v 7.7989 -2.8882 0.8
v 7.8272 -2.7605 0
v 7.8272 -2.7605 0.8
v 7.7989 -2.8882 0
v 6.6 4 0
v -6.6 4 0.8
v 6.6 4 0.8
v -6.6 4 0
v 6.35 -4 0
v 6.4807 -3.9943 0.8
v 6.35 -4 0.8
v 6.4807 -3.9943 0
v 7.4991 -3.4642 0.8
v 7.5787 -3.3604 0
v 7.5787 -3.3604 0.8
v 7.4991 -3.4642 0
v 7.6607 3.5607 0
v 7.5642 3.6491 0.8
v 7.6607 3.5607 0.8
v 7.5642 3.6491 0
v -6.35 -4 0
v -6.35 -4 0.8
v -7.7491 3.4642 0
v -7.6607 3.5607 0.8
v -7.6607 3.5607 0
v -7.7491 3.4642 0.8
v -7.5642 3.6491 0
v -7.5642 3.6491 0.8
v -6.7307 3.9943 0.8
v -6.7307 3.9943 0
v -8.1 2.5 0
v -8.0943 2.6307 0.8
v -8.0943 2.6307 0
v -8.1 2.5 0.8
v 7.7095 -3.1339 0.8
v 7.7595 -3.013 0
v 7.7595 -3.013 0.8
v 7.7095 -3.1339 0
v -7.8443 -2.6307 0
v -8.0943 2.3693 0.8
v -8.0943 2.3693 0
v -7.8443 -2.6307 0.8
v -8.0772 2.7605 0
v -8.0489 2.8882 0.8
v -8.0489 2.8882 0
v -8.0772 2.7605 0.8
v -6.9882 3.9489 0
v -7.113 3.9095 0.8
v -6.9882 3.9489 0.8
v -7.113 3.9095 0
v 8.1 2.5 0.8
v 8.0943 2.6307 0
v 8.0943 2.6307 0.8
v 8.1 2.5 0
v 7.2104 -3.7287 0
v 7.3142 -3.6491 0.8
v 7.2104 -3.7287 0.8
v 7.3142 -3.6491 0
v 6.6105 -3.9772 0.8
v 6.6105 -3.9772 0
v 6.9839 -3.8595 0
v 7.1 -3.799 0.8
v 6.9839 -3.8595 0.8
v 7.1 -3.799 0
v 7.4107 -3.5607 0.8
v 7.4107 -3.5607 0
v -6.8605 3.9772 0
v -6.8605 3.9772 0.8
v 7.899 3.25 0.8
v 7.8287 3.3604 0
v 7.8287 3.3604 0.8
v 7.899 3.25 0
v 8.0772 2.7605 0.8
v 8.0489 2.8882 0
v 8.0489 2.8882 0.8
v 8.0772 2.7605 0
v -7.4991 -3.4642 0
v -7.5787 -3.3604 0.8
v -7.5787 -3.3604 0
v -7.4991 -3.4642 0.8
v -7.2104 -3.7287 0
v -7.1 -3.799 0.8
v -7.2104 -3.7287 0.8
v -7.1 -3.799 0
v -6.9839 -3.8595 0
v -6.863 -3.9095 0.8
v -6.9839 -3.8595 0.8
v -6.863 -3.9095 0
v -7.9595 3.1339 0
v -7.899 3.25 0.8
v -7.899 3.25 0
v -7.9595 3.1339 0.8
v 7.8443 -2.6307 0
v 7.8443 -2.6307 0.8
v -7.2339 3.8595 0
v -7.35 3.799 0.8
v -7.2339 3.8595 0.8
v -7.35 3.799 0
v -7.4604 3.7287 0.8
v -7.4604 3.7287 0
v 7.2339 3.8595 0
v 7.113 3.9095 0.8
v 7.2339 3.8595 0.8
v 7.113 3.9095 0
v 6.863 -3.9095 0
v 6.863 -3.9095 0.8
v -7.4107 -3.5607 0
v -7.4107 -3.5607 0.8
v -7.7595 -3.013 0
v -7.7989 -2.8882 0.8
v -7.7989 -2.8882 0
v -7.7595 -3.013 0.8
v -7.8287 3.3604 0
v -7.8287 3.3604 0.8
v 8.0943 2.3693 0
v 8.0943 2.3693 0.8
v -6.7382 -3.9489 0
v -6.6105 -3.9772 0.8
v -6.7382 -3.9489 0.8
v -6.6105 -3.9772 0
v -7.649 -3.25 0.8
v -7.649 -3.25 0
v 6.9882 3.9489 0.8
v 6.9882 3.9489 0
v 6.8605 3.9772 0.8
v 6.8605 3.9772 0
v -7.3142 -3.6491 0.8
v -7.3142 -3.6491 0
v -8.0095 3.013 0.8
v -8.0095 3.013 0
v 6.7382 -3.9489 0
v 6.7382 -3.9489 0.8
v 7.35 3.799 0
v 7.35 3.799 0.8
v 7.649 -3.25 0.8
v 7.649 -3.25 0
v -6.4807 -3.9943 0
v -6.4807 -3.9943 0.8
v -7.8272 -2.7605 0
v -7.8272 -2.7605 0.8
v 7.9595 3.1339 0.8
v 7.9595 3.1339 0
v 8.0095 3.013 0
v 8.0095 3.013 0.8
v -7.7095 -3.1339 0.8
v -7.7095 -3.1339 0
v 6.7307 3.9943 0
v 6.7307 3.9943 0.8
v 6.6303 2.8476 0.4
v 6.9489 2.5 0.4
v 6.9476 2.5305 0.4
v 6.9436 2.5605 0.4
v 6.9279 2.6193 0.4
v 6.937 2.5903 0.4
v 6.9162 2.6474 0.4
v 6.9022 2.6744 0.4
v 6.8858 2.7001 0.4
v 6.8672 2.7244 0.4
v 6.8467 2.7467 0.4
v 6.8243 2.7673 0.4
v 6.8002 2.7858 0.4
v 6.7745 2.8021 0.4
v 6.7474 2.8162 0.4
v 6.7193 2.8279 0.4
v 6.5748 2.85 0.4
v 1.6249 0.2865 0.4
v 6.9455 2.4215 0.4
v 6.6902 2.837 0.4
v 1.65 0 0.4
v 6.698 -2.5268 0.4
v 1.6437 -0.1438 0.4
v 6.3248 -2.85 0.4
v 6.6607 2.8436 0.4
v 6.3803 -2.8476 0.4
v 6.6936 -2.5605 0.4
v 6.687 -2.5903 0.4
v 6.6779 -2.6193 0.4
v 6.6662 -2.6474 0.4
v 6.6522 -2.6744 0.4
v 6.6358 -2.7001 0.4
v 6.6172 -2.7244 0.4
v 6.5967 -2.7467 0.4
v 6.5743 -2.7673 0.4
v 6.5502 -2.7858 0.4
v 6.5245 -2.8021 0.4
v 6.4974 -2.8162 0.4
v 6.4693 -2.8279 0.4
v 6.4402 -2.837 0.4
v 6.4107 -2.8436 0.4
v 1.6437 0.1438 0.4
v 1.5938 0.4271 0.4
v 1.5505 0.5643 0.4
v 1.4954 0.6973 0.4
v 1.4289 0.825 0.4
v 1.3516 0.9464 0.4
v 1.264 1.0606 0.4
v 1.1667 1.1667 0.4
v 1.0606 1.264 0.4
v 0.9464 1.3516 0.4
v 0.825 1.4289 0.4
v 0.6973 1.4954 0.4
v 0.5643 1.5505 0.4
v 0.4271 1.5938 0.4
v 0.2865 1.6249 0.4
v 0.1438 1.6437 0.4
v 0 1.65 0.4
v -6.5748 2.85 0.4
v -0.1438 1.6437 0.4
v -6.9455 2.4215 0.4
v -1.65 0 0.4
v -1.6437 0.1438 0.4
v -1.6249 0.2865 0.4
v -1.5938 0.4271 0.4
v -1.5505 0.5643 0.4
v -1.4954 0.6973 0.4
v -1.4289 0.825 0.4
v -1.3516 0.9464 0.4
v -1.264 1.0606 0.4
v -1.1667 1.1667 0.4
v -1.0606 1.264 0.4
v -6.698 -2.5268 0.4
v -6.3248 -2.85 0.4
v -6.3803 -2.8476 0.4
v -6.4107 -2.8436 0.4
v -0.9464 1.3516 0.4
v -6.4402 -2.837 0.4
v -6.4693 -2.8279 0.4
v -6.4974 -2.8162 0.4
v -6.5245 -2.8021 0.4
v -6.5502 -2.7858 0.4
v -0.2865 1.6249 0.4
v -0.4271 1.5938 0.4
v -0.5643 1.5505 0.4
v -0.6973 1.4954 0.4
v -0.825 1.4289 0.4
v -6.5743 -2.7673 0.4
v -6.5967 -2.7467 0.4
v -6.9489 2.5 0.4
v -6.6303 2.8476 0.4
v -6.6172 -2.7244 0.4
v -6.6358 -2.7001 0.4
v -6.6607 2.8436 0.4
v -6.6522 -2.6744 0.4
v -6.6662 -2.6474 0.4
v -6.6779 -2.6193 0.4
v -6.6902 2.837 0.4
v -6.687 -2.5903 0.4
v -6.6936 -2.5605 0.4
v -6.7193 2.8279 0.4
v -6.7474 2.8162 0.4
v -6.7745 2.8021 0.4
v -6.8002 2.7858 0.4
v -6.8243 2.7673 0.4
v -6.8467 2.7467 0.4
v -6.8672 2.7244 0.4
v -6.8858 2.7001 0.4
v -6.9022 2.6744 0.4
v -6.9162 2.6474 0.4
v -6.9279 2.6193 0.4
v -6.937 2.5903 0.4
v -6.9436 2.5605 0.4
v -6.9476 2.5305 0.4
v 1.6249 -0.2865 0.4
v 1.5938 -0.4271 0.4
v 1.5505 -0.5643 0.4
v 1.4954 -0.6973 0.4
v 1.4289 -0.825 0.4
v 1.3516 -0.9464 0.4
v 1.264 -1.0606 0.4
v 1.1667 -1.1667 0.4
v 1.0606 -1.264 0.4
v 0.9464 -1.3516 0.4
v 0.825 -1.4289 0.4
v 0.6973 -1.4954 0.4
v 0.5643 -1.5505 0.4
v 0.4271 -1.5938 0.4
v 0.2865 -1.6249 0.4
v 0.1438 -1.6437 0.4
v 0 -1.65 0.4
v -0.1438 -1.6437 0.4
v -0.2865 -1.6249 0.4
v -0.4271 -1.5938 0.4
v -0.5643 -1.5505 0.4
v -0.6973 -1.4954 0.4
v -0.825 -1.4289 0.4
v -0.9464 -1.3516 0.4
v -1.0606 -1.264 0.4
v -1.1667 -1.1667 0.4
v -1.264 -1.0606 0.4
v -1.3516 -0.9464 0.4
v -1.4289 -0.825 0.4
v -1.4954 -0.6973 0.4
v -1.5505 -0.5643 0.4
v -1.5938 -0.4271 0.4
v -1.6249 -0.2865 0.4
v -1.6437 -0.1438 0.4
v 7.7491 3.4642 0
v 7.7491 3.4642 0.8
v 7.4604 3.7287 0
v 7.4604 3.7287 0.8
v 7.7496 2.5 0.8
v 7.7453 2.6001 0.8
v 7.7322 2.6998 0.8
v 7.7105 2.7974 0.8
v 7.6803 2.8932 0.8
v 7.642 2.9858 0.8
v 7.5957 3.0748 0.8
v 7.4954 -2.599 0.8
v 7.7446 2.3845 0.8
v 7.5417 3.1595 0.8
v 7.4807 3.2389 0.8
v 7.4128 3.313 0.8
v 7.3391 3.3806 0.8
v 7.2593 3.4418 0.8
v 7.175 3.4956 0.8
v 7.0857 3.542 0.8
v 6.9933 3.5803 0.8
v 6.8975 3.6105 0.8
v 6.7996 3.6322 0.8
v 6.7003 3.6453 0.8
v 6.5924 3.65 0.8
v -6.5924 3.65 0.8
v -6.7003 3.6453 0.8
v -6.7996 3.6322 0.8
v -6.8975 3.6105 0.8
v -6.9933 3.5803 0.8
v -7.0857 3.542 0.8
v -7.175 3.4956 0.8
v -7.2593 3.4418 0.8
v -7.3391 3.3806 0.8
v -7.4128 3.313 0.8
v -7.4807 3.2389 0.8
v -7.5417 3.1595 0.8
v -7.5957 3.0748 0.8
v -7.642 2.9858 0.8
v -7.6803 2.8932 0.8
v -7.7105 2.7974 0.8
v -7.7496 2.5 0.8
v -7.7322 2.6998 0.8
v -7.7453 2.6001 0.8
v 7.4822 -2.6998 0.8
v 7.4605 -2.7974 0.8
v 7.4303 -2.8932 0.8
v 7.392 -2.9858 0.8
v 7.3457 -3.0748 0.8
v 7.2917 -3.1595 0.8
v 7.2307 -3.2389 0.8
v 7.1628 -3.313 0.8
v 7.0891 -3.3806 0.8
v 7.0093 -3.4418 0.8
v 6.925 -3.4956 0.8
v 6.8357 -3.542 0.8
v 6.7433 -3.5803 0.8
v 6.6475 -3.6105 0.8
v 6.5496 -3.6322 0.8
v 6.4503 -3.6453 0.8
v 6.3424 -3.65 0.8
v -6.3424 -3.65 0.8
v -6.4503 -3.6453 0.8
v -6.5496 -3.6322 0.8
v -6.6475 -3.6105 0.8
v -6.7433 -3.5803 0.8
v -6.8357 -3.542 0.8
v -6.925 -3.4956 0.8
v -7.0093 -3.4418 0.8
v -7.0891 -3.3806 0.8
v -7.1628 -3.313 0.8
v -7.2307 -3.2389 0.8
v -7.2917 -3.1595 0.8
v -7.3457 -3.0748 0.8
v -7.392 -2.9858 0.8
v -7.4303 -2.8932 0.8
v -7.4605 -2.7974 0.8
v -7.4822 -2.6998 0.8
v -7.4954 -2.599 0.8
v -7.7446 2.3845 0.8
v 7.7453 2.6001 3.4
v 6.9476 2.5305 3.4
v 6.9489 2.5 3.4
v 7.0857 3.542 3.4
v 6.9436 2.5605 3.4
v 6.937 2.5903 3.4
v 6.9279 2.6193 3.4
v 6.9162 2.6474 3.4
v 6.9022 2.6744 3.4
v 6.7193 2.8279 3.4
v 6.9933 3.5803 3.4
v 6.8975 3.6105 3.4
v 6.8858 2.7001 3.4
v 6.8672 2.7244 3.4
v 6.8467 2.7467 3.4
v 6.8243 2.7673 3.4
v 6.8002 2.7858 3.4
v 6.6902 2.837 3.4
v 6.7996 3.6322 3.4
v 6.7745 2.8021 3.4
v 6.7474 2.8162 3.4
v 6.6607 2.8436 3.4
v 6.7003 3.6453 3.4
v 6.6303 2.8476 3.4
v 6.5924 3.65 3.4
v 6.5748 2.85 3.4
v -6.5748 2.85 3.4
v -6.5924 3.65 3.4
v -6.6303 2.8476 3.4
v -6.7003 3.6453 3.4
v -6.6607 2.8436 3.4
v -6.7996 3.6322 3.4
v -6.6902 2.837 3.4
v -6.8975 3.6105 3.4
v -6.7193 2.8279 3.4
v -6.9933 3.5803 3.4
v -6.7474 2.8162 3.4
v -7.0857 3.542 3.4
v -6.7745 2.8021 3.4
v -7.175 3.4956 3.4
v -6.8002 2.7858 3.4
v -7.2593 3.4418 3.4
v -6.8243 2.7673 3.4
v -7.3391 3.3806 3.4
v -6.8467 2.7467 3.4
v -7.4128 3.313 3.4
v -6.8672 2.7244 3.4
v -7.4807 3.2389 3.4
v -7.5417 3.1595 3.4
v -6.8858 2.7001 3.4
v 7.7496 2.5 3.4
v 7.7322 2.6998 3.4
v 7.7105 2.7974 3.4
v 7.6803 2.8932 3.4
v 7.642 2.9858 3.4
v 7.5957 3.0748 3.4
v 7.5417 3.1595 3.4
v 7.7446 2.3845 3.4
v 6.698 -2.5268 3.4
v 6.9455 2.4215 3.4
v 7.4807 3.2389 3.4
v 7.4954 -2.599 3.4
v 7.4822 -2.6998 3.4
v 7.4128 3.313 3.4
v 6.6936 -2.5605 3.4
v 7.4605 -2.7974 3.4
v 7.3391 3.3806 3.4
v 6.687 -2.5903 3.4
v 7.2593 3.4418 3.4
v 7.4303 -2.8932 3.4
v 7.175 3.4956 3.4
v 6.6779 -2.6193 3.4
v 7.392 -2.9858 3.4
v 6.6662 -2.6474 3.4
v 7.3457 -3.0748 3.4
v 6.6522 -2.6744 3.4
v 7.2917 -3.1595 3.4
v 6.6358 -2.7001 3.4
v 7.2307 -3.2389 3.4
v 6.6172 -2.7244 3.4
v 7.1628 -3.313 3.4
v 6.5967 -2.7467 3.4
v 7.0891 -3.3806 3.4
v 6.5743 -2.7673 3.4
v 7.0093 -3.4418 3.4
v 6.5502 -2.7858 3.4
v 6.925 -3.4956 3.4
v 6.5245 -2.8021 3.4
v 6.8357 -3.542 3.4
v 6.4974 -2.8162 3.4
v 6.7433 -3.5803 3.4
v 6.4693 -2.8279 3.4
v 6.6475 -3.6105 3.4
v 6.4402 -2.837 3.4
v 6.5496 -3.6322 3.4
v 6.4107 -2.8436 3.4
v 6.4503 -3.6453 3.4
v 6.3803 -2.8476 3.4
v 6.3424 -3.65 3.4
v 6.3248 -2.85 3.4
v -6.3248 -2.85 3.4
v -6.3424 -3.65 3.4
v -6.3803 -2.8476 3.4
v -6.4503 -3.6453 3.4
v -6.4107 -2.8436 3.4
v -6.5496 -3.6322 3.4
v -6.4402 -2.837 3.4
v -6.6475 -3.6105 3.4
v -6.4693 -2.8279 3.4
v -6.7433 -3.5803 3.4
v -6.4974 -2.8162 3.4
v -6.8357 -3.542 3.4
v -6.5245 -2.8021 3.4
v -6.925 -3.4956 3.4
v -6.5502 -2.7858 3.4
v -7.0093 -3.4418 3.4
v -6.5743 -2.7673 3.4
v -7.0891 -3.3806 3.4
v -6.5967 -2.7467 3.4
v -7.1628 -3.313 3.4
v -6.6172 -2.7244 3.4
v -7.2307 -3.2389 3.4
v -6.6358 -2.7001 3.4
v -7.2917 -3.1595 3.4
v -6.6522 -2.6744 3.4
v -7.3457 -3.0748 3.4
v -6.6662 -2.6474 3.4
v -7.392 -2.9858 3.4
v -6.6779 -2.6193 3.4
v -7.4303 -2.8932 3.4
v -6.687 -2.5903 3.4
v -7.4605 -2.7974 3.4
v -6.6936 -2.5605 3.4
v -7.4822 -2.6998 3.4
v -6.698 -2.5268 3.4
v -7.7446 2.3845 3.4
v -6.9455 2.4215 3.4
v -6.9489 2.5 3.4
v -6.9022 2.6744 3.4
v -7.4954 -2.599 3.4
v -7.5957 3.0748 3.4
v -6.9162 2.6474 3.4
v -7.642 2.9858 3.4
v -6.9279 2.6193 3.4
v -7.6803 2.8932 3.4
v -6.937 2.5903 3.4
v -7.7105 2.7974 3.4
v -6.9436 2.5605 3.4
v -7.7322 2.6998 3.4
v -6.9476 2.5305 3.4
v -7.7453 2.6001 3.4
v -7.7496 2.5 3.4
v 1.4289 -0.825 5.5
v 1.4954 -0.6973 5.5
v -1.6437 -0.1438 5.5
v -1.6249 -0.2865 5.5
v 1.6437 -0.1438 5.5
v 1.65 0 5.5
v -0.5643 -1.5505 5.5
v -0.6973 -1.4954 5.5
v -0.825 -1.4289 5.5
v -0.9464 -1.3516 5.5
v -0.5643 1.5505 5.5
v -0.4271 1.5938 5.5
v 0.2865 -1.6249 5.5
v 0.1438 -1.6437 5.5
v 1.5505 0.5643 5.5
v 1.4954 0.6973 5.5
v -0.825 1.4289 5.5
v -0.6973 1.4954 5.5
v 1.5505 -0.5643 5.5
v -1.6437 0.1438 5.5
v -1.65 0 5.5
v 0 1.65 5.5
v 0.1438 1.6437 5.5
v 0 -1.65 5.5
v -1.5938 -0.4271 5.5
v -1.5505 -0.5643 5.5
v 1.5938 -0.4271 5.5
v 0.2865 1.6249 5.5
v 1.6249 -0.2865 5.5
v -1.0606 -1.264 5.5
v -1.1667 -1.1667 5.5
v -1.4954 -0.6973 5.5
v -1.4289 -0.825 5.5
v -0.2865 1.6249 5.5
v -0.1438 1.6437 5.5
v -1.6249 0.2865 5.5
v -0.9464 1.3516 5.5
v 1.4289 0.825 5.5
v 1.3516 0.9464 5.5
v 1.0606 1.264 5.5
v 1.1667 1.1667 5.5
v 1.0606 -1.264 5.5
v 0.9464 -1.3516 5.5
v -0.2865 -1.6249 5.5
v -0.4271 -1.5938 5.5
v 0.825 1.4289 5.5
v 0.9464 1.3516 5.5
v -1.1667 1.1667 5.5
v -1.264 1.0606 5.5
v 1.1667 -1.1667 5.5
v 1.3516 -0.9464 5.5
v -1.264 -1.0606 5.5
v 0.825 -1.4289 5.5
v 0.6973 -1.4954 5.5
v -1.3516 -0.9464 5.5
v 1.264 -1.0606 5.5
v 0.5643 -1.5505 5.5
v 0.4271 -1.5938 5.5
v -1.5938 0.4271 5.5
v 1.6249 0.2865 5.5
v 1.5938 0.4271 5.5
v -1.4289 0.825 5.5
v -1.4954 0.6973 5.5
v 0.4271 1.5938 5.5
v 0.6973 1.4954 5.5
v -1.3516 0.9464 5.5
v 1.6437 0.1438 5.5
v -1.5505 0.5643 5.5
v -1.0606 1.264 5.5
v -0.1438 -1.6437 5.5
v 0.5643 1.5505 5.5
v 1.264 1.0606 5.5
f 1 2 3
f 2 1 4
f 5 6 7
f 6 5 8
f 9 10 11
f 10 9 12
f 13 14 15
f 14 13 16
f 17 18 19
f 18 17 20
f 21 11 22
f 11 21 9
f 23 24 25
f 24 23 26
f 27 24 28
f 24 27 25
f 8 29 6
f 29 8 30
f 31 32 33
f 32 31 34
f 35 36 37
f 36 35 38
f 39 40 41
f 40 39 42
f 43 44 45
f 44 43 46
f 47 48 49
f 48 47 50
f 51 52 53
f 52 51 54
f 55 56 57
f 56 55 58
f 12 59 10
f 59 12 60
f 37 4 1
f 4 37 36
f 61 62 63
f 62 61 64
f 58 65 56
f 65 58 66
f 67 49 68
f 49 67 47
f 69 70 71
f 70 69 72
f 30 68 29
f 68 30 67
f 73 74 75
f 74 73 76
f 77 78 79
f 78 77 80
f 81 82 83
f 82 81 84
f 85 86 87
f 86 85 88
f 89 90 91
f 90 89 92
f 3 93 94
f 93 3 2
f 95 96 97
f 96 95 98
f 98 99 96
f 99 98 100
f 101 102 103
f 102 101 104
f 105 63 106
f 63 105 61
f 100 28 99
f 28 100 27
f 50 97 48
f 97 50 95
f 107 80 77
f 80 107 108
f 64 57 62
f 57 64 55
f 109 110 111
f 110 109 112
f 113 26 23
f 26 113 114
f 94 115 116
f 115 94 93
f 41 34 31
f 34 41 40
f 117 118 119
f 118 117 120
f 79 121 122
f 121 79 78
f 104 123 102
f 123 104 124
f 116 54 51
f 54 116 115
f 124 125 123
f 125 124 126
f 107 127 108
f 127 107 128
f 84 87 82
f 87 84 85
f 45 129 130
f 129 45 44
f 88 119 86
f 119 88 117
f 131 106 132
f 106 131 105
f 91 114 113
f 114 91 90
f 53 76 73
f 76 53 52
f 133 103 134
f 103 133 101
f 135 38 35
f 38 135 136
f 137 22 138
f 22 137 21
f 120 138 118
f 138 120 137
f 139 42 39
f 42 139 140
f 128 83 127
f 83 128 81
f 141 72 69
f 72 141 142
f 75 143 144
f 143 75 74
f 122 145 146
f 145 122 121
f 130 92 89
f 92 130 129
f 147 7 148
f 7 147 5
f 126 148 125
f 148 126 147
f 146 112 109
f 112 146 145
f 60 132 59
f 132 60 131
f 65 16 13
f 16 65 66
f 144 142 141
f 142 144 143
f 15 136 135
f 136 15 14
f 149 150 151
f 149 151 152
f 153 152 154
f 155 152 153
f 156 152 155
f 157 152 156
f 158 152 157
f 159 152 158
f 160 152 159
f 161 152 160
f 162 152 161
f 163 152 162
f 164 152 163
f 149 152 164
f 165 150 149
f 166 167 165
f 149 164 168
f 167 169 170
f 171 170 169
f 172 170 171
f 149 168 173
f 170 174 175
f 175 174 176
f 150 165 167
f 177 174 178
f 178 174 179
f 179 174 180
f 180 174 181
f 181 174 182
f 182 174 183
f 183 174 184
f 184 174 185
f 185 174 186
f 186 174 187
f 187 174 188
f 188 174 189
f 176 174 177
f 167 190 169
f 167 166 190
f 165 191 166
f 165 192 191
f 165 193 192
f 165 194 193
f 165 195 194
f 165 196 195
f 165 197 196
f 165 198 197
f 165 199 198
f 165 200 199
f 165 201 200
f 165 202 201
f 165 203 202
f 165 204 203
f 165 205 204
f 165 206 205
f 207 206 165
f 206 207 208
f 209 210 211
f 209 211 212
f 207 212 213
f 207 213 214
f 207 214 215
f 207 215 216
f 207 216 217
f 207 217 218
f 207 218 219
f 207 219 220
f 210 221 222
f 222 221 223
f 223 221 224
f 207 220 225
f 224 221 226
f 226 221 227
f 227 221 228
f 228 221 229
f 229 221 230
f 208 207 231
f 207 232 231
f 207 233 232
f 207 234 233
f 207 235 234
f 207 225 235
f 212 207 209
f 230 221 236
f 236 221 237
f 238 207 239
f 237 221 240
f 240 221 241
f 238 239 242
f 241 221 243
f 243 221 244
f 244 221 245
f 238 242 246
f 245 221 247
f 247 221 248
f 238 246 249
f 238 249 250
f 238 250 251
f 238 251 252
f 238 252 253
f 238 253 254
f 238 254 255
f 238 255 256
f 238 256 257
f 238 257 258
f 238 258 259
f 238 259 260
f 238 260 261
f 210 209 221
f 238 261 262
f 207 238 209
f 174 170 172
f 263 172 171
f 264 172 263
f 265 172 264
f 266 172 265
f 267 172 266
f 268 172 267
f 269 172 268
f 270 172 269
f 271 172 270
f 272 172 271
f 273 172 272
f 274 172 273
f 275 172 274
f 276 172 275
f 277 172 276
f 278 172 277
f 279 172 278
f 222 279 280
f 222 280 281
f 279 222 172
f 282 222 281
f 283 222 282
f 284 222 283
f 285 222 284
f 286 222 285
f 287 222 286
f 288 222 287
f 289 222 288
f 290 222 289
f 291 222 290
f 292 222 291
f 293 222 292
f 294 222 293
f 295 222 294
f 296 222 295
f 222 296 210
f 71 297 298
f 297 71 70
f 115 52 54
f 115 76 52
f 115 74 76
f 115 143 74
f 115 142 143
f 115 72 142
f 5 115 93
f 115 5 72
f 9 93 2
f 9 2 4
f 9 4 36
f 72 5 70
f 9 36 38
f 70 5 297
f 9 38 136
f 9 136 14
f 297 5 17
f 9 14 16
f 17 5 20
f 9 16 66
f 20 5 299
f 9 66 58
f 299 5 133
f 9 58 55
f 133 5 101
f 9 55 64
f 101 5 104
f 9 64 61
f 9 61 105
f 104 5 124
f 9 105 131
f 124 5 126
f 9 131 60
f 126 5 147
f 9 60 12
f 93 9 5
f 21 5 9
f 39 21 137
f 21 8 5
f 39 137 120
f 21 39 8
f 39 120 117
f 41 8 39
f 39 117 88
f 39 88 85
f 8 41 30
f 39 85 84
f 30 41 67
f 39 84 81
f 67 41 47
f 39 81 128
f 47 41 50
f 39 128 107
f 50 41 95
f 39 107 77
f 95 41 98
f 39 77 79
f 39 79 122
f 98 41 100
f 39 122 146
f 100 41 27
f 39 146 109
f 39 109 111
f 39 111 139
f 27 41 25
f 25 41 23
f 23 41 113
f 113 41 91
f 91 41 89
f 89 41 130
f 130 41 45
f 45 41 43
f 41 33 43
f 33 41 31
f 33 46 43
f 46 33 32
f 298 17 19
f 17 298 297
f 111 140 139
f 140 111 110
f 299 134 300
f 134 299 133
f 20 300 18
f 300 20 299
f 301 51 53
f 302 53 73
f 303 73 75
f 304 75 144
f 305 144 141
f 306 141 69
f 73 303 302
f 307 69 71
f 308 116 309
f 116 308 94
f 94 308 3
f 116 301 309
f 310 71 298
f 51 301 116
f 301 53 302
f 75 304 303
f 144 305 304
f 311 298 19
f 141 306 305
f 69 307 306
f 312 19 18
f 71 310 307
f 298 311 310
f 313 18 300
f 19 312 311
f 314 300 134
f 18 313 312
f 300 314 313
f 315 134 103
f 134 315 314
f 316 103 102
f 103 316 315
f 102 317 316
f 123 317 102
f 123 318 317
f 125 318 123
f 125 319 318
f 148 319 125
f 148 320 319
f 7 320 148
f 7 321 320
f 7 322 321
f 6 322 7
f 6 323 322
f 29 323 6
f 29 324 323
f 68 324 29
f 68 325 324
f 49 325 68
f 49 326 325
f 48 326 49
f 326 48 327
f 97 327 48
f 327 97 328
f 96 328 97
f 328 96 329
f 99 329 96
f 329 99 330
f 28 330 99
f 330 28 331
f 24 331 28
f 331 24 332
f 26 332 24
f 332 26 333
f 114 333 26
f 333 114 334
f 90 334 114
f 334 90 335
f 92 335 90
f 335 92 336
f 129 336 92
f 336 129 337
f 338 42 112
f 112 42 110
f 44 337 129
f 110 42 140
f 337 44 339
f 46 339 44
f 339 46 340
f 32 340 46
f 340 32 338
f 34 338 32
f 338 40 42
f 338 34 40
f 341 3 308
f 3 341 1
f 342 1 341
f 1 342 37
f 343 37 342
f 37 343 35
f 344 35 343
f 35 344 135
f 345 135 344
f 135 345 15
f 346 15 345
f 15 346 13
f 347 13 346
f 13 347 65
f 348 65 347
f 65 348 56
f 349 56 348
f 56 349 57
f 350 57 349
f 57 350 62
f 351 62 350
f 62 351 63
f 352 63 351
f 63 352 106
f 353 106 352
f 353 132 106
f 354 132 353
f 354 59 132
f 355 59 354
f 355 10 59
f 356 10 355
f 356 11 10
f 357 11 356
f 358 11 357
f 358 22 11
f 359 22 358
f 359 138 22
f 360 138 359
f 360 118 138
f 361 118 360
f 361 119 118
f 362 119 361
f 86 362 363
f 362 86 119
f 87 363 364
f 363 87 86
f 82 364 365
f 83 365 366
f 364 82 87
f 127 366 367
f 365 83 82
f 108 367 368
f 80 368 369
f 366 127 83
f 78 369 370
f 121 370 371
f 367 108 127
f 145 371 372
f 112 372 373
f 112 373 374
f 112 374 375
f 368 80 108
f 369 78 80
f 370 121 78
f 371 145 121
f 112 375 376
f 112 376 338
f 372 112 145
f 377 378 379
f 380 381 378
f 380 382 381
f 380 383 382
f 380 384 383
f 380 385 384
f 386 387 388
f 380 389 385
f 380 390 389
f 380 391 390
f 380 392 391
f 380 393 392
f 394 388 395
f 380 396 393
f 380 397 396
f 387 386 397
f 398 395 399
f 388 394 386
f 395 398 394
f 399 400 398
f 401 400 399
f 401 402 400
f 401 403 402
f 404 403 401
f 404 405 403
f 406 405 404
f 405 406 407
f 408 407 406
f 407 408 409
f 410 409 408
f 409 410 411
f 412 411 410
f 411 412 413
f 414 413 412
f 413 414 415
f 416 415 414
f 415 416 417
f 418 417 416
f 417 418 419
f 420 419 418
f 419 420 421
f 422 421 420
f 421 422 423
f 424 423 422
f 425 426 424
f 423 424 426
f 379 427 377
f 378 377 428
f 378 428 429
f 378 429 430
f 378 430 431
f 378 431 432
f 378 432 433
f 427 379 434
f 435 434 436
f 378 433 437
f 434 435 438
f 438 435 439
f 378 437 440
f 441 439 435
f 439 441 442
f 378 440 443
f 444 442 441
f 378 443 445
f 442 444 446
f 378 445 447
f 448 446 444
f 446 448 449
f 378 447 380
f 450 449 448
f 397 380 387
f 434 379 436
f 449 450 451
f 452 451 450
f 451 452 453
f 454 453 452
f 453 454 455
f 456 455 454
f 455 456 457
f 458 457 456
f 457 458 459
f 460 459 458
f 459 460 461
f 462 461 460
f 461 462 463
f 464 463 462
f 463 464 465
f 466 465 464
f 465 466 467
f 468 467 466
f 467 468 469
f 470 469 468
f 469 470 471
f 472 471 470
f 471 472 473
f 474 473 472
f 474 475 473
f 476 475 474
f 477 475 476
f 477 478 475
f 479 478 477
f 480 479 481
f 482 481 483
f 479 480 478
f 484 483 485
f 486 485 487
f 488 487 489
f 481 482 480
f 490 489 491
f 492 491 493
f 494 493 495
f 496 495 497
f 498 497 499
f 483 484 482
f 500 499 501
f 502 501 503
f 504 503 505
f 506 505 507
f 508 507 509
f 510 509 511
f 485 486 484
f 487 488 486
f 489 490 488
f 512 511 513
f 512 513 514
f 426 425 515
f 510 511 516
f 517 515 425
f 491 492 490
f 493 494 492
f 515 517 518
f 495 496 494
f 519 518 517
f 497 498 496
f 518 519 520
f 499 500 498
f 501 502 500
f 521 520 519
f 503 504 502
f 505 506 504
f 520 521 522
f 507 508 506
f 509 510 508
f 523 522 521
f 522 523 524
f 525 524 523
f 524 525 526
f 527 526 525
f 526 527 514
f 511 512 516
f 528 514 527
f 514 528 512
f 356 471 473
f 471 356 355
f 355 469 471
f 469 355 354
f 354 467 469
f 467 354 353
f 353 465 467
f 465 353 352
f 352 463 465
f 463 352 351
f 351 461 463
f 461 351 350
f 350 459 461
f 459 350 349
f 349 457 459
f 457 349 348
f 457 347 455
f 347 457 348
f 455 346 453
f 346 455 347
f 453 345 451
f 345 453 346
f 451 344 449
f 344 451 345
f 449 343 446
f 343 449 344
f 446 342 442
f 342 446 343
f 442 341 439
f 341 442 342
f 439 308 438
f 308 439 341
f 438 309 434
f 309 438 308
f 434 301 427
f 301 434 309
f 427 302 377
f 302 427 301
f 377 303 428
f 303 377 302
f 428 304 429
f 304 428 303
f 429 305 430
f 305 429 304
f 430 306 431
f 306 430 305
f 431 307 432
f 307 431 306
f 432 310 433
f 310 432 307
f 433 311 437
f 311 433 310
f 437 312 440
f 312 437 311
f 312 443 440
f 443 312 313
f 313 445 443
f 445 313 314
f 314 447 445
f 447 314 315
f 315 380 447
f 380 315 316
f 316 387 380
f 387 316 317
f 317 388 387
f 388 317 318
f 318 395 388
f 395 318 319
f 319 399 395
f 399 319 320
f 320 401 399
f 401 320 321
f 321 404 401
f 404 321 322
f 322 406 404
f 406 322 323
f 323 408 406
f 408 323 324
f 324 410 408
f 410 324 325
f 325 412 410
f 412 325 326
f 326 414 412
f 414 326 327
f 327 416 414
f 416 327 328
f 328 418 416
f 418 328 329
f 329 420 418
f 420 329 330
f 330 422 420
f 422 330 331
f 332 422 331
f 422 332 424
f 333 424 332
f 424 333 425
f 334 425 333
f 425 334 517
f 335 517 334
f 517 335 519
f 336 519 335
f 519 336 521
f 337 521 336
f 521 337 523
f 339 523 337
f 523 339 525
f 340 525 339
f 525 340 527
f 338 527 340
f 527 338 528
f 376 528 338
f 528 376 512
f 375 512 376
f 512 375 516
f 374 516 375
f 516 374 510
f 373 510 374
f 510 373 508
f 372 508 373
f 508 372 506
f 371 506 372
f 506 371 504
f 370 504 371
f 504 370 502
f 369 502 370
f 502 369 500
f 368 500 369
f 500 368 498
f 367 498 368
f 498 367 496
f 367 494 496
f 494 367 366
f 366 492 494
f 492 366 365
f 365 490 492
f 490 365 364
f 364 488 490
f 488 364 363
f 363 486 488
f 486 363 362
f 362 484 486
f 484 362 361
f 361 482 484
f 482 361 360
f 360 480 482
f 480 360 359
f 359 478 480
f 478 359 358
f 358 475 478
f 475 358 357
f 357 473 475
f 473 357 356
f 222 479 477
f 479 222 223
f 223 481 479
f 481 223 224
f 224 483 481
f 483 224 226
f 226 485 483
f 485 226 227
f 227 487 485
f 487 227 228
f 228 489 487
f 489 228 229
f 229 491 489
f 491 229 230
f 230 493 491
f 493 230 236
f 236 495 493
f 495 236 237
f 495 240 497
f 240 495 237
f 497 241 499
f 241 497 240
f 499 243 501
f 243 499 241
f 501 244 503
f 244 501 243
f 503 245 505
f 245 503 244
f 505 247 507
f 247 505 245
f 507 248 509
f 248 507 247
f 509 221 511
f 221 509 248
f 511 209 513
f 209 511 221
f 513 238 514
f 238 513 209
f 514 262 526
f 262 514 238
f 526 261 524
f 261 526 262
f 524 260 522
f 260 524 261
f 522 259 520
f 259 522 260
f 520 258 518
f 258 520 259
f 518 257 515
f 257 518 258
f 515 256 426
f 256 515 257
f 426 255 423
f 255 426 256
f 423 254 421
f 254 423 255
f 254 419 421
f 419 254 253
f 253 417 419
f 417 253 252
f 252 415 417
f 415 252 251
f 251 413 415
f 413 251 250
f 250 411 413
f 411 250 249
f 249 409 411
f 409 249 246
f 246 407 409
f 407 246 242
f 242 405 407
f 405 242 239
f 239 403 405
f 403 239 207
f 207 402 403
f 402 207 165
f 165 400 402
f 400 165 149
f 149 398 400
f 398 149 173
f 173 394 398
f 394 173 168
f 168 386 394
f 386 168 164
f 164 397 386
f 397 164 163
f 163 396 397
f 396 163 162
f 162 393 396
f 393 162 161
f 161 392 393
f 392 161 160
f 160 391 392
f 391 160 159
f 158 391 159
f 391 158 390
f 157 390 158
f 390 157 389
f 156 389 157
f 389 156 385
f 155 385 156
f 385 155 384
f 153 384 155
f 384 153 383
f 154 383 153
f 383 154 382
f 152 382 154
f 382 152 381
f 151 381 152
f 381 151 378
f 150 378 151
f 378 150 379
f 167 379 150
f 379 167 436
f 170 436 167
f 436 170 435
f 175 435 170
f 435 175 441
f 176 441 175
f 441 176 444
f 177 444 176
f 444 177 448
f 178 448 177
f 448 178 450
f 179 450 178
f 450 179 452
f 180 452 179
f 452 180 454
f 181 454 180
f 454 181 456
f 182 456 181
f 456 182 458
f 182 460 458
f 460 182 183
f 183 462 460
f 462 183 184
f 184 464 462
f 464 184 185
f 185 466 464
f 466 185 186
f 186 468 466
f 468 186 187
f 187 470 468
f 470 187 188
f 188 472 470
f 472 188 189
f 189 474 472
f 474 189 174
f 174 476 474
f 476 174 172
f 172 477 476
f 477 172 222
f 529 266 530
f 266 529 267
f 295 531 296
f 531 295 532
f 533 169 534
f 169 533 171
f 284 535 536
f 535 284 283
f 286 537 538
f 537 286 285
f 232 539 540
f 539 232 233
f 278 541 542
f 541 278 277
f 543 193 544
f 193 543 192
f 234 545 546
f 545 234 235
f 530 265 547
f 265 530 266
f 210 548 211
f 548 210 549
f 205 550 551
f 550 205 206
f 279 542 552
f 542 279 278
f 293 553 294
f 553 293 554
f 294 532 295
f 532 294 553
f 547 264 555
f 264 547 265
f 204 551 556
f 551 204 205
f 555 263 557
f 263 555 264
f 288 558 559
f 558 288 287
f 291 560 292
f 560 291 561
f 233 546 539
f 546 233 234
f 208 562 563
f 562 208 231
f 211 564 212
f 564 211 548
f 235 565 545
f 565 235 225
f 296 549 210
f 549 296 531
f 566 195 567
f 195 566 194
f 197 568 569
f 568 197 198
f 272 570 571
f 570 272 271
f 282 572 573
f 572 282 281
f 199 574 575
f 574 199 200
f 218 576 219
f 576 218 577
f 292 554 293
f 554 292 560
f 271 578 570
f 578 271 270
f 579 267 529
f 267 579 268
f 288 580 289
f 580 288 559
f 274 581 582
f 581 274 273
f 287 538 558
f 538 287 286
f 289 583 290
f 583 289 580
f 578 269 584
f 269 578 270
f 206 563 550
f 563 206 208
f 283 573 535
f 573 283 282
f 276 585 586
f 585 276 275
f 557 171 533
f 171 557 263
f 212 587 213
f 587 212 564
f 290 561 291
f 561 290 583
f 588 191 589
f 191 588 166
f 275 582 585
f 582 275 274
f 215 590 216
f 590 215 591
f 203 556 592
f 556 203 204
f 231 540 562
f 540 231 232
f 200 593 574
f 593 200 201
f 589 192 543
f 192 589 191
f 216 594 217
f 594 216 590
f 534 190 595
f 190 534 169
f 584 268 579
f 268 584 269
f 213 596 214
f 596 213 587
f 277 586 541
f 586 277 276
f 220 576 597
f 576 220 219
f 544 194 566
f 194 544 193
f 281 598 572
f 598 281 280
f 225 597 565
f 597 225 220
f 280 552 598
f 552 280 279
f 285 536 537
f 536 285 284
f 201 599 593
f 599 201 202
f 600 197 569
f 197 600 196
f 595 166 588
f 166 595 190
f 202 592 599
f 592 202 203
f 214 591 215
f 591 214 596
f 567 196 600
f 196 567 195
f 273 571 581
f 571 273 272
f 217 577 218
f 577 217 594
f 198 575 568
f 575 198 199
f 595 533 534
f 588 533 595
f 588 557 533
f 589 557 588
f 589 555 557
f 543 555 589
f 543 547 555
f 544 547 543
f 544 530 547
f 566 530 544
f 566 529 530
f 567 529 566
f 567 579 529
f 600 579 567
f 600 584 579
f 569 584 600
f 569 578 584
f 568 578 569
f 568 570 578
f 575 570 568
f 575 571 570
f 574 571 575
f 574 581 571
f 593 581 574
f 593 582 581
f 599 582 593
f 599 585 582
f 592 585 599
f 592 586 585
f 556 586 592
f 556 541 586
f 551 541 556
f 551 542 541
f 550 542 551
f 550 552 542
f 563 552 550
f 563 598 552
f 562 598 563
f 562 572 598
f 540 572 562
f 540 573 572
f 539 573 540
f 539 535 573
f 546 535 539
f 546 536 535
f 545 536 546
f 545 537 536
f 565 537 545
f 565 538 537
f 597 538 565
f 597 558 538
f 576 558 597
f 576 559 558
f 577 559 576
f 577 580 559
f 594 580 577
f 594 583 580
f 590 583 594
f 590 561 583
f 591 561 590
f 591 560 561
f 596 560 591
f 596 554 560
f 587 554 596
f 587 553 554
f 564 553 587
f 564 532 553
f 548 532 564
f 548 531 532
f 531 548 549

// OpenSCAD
l1 = 15.7;
l2 = 16.2;
w = 8.0;
d = 5.5;
pin_dia = 4.0;

d1 = 0.4;
d2 = 0.8;
d3 = 3.4;

thick = 0.8;
toll_r = 0.35;
corner_r = 1.5;

$fa = 5;
$fs = 0.1;

points_base = [ [-.5*l1, -.5*w], [-.5*l2, .5*w], [.5*l2, .5*w], [.5*l1, -.5*w]];

function prev(i, L) = (i<=0 ? len(L)-1 : i-1);
function next(i, L) = (i>=len(L)-1 ? 0 : i+1);
function flatten(l) = [ for (a = l) for (b = a) b ] ;

function cornercut(points, rad) =
  flatten
  ([ for (b = [0 : len(points)-1])
      let (a = prev(b, points),
           c = next(b, points),
           x = points[b][0],
           y = points[b][1],
           x1 = points[a][0],
           y1 = points[a][1],
           x2 = points[c][0],
           y2 = points[c][1],
           l1 = sqrt((x-x1)*(x-x1) + (y-y1)*(y-y1)),
           l2 = sqrt((x2-x)*(x2-x) + (y2-y)*(y2-y)),
           xm1 = x + rad/l1*(x1-x),
           ym1 = y + rad/l1*(y1-y),
           xm2 = x + rad/l2*(x2-x),
           ym2 = y + rad/l2*(y2-y)
           )
      [[xm1, ym1], [xm2, ym2]]
     ]);

module base2d_stupid() {
  deltas = [[-1,-1], [-1, 1], [1, 1], [1, -1]];
  union() {
    polygon(points=cornercut(points_base, corner_r));
    for (i = [0 : 1]) {
      for (j = [0 : 1]) {
        x = points_base[i*2+j][0];
        y = points_base[i*2+j][1];
        dx = deltas[i*2+j][0];
        dy = deltas[i*2+j][1];
        translate([x - dx*corner_r, y - dy*corner_r]) {
          circle(r=corner_r);
        }
      }
    }
  }
}

module base2d() {
  deltas = [[-1,-1], [-1, 1], [1, 1], [1, -1]];
  hull() {
    for (i = [0 : 1]) {
      for (j = [0 : 1]) {
        x = points_base[i*2+j][0];
        y = points_base[i*2+j][1];
        dx = deltas[i*2+j][0];
        dy = deltas[i*2+j][1];
        translate([x - dx*corner_r, y - dy*corner_r]) {
          circle(r=corner_r);
        }
      }
    }
  }
}

linear_extrude(height=d1) {
  base2d();
}

linear_extrude(height=d2) {
  difference() {
    base2d();
    offset(r = -thick) {
      base2d();
    }
  }
}

linear_extrude(height=d3) {
  difference() {
    offset(r = -toll_r) {
      base2d();
    }
    offset(r = -(toll_r+thick)) {
      base2d();
    }
  }
}

linear_extrude(height=d) {
  circle(r=.5*pin_dia - toll_r);
}
